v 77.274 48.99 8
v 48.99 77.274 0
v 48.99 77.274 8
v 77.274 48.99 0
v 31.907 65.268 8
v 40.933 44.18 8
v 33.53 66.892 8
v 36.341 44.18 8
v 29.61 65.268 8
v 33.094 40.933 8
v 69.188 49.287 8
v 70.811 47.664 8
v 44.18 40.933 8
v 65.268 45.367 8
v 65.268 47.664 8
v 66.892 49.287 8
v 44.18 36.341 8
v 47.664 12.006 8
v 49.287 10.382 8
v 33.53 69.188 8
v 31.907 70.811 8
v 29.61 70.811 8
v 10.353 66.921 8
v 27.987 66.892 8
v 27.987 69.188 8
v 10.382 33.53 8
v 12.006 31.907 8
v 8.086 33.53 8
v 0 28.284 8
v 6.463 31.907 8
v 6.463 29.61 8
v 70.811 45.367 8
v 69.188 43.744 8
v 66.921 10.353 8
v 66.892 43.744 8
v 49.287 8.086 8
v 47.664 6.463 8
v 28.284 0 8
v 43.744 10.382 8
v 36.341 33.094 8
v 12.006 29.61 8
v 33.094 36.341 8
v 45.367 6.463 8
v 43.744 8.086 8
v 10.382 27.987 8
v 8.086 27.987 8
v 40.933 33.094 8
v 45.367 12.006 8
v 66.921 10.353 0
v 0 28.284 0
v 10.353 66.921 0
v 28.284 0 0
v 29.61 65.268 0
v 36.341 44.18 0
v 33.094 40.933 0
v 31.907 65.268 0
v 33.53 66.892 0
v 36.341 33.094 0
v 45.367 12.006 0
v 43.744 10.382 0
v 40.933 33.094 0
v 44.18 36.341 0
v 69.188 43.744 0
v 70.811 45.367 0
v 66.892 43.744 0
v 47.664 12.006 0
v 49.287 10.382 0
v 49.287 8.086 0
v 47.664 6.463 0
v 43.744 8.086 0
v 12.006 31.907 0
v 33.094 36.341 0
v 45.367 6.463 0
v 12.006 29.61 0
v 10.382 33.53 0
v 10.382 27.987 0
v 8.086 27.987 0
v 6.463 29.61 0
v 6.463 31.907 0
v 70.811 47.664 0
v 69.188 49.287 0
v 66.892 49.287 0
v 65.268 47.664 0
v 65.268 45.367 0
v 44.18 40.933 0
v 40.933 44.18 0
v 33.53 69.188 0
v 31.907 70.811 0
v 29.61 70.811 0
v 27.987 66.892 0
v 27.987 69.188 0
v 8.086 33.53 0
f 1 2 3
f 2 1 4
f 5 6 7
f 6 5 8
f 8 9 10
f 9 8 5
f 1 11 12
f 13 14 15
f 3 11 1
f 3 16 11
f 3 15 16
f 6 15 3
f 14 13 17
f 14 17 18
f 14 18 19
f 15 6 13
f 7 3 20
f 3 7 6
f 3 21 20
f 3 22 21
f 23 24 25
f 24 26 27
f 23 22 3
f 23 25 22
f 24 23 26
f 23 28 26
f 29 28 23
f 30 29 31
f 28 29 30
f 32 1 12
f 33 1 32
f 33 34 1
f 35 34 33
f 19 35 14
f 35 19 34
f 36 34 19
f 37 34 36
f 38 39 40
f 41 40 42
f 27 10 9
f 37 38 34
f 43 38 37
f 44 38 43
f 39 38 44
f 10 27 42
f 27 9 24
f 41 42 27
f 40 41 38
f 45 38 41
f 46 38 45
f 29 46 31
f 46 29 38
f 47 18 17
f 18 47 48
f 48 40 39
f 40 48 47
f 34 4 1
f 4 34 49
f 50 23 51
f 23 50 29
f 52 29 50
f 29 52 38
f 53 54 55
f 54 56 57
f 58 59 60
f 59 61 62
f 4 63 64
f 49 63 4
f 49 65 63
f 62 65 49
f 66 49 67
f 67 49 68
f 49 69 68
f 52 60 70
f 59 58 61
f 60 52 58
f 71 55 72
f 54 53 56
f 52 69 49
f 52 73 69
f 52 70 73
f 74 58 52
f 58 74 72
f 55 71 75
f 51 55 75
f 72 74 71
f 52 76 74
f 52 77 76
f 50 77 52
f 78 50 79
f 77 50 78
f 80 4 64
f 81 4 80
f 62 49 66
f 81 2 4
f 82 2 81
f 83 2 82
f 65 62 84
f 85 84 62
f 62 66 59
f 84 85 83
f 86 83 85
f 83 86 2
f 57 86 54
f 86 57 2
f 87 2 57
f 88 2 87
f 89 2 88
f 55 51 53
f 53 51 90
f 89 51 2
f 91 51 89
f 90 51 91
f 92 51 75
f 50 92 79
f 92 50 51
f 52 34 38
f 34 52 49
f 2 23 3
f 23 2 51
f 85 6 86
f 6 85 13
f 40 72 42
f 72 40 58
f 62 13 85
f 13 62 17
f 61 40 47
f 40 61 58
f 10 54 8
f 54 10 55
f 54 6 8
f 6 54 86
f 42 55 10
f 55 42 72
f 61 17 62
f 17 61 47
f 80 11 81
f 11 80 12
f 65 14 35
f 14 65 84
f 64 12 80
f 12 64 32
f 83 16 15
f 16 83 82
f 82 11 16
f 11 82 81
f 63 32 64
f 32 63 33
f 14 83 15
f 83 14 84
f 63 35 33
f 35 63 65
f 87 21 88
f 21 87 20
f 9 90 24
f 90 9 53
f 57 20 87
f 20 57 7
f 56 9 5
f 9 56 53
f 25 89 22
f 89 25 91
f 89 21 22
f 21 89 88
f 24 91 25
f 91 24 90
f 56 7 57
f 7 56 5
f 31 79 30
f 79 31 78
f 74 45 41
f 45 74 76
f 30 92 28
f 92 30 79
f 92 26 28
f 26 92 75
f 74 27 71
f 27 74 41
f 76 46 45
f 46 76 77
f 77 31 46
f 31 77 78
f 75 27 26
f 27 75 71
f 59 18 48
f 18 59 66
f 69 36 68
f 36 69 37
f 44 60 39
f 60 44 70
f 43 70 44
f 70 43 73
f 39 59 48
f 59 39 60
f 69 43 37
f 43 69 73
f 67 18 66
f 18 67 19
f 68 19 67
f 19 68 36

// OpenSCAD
$fn = 32;

// ----------------------------------------------------------------------
// Polygon plate: 6-gon R40, 4 bolt windows
// ----------------------------------------------------------------------

// --- parameters (mm) ---
sides = 6;                // number of polygon sides
plate_r = 40;             // circumscribed radius of the polygon
bore_r = 6;               // centre bore radius
bolts = 4;                // number of bolt windows
ring_r = 30.44;           // bolt-circle radius
bolt_r = 3;               // bolt window radius
plate_t = 8;              // plate thickness, Z (extrusion height)

plate_d = 2 * plate_r;  // circumscribed diameter
bore_d = 2 * bore_r;  // centre bore diameter
bolt_d = 2 * bolt_r;  // bolt window diameter
ring_d = 2 * ring_r;  // bolt-circle diameter

profile = [[77.274, 48.99], [48.99, 77.274], [10.353, 66.921], [0, 28.284], [28.284, 0], [66.921, 10.353]];  // primary outline, 6 points, counter clockwise
void_1 = [[44.18, 40.933], [40.933, 44.18], [36.341, 44.18], [33.094, 40.933], [33.094, 36.341], [36.341, 33.094], [40.933, 33.094], [44.18, 36.341]];  // centre bore, 8 points
void_2 = [[70.811, 47.664], [69.188, 49.287], [66.892, 49.287], [65.268, 47.664], [65.268, 45.367], [66.892, 43.744], [69.188, 43.744], [70.811, 45.367]];  // bolt window 1, 8 points
void_3 = [[33.53, 69.188], [31.907, 70.811], [29.61, 70.811], [27.987, 69.188], [27.987, 66.892], [29.61, 65.268], [31.907, 65.268], [33.53, 66.892]];  // bolt window 2, 8 points
void_4 = [[12.006, 31.907], [10.382, 33.53], [8.086, 33.53], [6.463, 31.907], [6.463, 29.61], [8.086, 27.987], [10.382, 27.987], [12.006, 29.61]];  // bolt window 3, 8 points
void_5 = [[49.287, 10.382], [47.664, 12.006], [45.367, 12.006], [43.744, 10.382], [43.744, 8.086], [45.367, 6.463], [47.664, 6.463], [49.287, 8.086]];  // bolt window 4, 8 points

// --- the one profile operation ---
difference() {
  linear_extrude(height = plate_t) polygon(points = profile);
  translate([0, 0, -1])
    linear_extrude(height = plate_t + 2) polygon(points = void_1);
  translate([0, 0, -1])
    linear_extrude(height = plate_t + 2) polygon(points = void_2);
  translate([0, 0, -1])
    linear_extrude(height = plate_t + 2) polygon(points = void_3);
  translate([0, 0, -1])
    linear_extrude(height = plate_t + 2) polygon(points = void_4);
  translate([0, 0, -1])
    linear_extrude(height = plate_t + 2) polygon(points = void_5);
}
